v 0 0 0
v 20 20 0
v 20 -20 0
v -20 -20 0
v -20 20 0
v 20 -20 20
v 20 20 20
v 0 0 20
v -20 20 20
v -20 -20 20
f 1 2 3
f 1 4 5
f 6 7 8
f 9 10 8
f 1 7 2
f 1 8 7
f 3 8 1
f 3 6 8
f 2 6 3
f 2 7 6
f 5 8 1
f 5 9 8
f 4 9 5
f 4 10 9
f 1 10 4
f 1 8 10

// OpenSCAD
scale(20)
linear_extrude(height = 1) {
    polygon(
        points=[
            [-1,-1],
            [+1,+1],
            [+1,-1],
            [-1,+1]
        ]
    );
}
